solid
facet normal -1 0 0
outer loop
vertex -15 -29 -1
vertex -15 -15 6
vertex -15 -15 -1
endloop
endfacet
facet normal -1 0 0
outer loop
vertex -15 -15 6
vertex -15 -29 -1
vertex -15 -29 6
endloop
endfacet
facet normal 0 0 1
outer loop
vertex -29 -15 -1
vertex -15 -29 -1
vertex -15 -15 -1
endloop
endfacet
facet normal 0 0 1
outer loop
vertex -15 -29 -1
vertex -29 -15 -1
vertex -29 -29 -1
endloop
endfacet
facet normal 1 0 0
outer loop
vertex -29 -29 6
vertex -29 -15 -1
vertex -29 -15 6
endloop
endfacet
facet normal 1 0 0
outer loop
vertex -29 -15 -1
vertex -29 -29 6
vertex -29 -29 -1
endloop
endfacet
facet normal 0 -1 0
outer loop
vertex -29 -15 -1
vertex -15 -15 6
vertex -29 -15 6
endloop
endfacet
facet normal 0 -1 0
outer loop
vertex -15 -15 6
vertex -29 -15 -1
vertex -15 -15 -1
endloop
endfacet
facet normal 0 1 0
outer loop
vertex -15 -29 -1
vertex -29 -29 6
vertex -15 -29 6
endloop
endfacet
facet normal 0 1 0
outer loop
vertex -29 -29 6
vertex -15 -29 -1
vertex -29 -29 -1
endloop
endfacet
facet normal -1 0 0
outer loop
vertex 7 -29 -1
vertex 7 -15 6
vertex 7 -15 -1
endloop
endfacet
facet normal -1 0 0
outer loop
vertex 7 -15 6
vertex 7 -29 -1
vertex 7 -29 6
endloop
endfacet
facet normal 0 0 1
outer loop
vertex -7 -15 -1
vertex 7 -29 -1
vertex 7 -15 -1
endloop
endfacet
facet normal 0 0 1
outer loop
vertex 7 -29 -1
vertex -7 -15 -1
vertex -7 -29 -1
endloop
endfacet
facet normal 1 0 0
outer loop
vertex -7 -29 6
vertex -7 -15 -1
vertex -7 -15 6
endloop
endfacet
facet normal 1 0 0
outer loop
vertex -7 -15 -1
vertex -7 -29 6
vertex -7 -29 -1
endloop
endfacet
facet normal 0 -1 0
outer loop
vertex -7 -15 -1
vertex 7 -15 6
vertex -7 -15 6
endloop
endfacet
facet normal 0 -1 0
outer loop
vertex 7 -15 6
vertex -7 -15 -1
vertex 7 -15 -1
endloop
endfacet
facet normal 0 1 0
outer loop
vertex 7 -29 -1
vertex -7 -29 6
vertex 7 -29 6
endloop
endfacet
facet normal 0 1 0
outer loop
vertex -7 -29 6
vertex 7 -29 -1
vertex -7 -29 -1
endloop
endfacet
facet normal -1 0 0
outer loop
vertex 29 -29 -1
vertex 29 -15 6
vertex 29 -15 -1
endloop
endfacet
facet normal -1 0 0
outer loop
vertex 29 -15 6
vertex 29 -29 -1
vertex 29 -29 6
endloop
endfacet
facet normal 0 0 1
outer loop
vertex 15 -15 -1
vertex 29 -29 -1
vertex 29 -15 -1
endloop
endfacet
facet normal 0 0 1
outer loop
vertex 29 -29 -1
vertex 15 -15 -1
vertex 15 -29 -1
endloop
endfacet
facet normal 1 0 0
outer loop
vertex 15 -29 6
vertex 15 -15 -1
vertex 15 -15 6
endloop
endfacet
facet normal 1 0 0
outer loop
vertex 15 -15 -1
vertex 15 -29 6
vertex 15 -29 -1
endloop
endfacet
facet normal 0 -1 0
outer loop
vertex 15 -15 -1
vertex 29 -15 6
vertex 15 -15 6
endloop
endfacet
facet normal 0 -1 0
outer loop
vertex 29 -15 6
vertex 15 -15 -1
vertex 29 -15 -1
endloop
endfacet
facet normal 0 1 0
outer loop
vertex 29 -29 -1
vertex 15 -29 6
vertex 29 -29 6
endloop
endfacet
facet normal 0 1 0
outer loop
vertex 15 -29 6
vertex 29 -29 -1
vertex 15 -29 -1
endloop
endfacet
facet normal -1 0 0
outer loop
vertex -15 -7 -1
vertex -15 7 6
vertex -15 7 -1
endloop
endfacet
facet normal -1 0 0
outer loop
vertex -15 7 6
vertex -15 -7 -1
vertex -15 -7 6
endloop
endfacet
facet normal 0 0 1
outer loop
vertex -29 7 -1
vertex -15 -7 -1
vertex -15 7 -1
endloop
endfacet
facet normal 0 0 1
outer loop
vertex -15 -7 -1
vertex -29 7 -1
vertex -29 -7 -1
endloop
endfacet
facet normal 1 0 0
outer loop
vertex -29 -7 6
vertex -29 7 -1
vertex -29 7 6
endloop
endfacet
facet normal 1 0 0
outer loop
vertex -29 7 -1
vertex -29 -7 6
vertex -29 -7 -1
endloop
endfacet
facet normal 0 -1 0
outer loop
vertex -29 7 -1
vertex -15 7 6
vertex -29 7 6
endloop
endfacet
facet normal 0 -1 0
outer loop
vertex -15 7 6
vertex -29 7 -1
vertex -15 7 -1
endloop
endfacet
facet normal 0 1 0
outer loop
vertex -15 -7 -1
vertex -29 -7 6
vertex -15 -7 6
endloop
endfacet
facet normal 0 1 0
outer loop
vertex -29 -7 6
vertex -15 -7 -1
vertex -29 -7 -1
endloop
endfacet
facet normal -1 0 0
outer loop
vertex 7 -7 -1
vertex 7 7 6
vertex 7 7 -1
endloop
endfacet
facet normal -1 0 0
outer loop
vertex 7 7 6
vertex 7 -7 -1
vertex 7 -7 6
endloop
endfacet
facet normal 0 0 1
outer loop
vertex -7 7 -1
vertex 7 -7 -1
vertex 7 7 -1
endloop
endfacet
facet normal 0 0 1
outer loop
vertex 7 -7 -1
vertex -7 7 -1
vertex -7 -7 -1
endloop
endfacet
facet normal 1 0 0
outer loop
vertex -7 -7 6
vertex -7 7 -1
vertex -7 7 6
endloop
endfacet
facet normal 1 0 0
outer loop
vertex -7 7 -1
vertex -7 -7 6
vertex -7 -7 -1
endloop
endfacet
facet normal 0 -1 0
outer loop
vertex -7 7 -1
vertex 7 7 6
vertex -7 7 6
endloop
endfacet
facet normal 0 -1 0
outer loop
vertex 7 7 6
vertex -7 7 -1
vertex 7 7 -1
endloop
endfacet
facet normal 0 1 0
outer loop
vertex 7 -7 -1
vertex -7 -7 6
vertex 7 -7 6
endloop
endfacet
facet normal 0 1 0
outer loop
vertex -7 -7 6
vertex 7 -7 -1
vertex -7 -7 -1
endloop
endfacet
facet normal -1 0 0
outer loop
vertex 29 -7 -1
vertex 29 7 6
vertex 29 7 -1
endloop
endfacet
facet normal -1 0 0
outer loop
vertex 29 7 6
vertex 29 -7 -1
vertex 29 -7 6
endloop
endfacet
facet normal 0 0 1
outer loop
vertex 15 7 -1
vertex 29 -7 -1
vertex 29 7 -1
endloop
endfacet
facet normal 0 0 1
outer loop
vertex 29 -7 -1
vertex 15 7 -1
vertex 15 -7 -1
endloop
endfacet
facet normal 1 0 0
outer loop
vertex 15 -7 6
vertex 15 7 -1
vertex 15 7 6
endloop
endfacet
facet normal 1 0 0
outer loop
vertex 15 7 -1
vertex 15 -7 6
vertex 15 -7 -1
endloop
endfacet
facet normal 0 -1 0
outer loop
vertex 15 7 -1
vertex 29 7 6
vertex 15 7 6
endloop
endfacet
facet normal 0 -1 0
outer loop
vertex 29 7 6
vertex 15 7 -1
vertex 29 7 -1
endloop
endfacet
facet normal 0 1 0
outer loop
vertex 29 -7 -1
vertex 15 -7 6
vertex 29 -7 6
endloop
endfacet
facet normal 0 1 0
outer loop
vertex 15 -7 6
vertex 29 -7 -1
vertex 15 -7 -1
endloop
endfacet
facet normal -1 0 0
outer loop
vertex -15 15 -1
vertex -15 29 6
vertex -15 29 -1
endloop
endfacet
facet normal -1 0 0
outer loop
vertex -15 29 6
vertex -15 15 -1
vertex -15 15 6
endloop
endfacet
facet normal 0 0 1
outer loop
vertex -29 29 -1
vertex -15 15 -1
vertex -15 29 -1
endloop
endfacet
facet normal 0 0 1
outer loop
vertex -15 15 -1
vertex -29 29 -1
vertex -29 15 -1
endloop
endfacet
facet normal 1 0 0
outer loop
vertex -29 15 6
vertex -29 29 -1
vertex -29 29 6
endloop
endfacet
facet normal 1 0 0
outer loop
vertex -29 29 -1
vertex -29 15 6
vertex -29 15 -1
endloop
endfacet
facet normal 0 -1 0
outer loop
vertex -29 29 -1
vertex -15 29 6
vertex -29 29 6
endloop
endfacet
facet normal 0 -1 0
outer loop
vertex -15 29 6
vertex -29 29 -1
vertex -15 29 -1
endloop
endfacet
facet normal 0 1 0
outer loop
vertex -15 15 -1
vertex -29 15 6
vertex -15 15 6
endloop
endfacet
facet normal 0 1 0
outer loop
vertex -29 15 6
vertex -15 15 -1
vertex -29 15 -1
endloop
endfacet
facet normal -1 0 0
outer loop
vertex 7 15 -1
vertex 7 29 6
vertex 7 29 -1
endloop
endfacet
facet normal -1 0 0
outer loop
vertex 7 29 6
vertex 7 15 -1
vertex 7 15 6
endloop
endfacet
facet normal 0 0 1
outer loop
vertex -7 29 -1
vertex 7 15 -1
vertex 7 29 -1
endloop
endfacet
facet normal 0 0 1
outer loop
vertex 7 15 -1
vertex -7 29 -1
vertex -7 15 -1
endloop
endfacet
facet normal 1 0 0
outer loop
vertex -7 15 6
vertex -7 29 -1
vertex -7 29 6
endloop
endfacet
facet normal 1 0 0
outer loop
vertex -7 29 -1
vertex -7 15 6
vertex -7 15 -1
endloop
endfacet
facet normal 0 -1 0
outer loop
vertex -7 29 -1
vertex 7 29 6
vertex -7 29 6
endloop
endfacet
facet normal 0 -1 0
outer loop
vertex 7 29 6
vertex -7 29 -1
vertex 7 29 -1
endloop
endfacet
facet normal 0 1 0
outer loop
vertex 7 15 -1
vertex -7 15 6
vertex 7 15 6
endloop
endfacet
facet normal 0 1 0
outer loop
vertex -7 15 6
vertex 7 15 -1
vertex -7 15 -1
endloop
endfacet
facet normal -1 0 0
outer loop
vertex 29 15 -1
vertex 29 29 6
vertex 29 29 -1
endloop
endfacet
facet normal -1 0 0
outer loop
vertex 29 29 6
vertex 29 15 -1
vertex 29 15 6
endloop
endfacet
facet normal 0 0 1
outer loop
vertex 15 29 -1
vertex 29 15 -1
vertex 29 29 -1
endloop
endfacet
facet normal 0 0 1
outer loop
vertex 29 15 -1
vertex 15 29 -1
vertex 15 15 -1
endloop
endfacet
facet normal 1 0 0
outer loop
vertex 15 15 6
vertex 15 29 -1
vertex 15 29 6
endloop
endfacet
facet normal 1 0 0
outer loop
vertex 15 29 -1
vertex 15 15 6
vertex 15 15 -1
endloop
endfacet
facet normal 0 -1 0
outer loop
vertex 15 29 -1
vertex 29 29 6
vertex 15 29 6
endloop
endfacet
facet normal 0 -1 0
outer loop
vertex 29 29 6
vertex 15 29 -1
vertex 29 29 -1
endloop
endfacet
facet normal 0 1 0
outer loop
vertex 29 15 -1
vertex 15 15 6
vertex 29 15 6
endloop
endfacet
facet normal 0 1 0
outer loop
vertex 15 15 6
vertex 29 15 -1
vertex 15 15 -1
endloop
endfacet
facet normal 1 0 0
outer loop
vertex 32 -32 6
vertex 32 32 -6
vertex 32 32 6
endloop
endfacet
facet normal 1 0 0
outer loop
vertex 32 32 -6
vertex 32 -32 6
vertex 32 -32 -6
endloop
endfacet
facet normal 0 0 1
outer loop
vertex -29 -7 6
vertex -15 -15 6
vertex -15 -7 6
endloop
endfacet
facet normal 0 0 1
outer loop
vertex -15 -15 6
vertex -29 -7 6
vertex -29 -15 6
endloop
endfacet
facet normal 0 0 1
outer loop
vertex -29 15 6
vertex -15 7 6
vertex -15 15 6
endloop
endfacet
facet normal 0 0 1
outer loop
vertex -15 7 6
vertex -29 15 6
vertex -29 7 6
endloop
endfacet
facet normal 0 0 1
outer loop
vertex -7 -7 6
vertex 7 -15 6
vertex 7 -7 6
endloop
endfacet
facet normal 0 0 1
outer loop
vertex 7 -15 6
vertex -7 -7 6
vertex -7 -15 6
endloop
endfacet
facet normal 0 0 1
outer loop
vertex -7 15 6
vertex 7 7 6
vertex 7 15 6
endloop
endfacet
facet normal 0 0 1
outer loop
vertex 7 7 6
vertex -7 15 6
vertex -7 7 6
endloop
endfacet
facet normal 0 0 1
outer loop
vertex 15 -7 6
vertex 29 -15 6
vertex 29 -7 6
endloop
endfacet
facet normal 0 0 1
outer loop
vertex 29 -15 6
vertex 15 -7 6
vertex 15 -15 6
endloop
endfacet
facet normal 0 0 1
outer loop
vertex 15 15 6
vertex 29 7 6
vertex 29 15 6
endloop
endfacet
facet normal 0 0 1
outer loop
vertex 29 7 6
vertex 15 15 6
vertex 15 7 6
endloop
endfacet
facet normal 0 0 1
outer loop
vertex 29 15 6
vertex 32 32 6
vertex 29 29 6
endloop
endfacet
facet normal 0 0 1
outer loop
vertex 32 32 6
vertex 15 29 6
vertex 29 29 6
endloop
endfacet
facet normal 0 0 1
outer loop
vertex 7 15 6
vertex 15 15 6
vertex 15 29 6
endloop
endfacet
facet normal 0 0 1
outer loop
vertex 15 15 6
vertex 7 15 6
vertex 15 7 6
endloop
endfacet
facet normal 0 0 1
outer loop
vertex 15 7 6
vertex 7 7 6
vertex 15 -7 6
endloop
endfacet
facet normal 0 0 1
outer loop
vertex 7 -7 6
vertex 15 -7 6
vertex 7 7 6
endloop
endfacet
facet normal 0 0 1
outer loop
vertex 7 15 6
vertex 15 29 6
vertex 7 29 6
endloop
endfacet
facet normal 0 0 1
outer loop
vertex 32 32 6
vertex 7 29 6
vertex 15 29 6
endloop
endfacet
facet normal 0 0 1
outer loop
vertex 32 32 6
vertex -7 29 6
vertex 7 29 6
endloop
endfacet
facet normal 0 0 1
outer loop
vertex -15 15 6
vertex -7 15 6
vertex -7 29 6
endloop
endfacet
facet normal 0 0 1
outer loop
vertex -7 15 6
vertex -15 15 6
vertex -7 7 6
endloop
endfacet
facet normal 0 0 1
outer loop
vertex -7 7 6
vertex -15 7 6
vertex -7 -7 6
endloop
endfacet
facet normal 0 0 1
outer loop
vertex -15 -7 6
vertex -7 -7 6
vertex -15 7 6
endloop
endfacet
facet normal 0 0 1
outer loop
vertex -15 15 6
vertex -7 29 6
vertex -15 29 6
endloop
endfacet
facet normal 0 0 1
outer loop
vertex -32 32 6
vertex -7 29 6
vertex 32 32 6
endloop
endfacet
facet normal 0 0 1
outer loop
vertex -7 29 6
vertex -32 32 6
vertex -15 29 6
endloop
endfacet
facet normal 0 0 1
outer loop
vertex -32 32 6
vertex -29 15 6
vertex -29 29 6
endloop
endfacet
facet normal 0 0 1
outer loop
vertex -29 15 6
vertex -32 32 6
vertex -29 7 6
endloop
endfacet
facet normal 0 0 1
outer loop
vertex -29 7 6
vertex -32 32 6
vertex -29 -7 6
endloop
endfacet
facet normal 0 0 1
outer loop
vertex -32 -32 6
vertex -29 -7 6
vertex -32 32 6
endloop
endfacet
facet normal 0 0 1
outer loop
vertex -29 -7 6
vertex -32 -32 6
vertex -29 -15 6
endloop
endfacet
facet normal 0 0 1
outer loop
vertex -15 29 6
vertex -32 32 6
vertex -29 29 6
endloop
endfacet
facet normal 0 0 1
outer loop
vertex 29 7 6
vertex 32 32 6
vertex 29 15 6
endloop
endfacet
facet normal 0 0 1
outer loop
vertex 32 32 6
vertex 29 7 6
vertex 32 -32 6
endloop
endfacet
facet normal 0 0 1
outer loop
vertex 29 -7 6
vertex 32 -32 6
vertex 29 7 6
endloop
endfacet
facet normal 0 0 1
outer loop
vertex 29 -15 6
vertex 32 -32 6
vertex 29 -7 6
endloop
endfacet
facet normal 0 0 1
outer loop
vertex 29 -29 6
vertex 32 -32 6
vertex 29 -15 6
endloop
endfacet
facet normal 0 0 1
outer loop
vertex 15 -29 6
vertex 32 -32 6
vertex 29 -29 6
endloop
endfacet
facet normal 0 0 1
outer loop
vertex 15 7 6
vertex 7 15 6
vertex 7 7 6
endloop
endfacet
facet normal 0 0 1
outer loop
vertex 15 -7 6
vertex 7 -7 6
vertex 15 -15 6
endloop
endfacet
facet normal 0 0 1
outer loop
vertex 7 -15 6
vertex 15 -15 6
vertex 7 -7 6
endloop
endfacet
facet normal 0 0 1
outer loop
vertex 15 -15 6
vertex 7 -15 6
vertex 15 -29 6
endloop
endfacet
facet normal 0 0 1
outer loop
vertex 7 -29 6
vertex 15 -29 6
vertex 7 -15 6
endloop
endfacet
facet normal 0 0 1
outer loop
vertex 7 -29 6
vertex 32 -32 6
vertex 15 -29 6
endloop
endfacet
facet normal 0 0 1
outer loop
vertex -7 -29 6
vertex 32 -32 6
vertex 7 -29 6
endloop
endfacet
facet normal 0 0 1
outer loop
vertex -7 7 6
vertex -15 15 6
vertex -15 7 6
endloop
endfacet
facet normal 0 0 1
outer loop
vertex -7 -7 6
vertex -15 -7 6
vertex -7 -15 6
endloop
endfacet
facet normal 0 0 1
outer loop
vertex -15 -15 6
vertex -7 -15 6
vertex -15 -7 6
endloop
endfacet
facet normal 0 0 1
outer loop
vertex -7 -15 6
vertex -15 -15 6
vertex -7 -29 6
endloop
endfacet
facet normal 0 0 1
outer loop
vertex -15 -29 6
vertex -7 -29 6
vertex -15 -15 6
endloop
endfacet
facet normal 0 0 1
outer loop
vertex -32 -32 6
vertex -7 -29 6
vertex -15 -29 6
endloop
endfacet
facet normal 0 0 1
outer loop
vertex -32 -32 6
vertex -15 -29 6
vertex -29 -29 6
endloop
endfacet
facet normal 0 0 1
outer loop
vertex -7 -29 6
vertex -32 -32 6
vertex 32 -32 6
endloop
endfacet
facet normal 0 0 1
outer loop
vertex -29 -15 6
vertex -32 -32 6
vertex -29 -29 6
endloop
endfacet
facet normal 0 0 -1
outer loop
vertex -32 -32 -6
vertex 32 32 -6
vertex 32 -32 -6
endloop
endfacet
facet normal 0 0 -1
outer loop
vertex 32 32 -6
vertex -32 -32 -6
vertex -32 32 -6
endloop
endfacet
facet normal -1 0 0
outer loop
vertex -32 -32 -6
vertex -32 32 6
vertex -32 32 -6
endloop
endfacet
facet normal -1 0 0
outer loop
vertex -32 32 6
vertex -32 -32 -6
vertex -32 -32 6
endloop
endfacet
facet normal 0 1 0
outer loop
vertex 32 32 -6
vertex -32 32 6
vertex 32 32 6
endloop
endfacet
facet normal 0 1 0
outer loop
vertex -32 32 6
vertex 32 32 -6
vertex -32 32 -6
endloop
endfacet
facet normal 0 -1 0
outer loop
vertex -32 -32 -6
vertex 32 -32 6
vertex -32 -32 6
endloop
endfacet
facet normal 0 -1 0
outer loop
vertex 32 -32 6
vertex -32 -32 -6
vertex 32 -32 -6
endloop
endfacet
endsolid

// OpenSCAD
$fn = 32;

// ----------------------------------------------------------------------
// Pocket plate 64 x 64 x 12
// 3 x 3 pockets 14 mm square, 7 mm deep
// ----------------------------------------------------------------------

// --- parameters (mm) ---
thickness = 12;  // plate thickness
floor_t = 5;     // material left under each pocket
pocket = 14;     // pocket side length
pitch_x = 22;    // pocket pitch along X
pitch_y = 22;    // pocket pitch along Y
cols = 3;        // pockets per row
rows = 3;        // rows of pockets

// --- derived feature positions (mm) ---
depth = thickness - floor_t;        // = 7   pocket depth, down to the floor
span_x = (cols - 1) * pitch_x;      // = 44   distance between outer pockets
span_y = (rows - 1) * pitch_y;      // = 44   distance between outer pocket rows
origin_x = -span_x / 2;             // = -22   X of the first pocket
origin_y = -span_y / 2;             // = -22   Y of the first pocket
plate = [span_x + pocket + 6, span_y + pocket + 6, thickness];  // = [64, 64, 12]   overall size: pockets plus 3 mm of wall on each side
feature_centers = [
  [origin_x + 0 * pitch_x, origin_y + 0 * pitch_y],
  [origin_x + 1 * pitch_x, origin_y + 0 * pitch_y],
  [origin_x + 2 * pitch_x, origin_y + 0 * pitch_y],
  [origin_x + 0 * pitch_x, origin_y + 1 * pitch_y],
  [origin_x + 1 * pitch_x, origin_y + 1 * pitch_y],
  [origin_x + 2 * pitch_x, origin_y + 1 * pitch_y],
  [origin_x + 0 * pitch_x, origin_y + 2 * pitch_y],
  [origin_x + 1 * pitch_x, origin_y + 2 * pitch_y],
  [origin_x + 2 * pitch_x, origin_y + 2 * pitch_y]
];   // pocket centres, used verbatim by the cutter loop

// plate outline, then one pocket per centre in feature_centers
difference() {
  cube(plate, center = true);
  for (centre = feature_centers)
    translate([centre[0] - pocket / 2, centre[1] - pocket / 2, plate[2] / 2 - depth])
      cube([pocket, pocket, depth + 1]);  // centred on the declared pocket centre
}
